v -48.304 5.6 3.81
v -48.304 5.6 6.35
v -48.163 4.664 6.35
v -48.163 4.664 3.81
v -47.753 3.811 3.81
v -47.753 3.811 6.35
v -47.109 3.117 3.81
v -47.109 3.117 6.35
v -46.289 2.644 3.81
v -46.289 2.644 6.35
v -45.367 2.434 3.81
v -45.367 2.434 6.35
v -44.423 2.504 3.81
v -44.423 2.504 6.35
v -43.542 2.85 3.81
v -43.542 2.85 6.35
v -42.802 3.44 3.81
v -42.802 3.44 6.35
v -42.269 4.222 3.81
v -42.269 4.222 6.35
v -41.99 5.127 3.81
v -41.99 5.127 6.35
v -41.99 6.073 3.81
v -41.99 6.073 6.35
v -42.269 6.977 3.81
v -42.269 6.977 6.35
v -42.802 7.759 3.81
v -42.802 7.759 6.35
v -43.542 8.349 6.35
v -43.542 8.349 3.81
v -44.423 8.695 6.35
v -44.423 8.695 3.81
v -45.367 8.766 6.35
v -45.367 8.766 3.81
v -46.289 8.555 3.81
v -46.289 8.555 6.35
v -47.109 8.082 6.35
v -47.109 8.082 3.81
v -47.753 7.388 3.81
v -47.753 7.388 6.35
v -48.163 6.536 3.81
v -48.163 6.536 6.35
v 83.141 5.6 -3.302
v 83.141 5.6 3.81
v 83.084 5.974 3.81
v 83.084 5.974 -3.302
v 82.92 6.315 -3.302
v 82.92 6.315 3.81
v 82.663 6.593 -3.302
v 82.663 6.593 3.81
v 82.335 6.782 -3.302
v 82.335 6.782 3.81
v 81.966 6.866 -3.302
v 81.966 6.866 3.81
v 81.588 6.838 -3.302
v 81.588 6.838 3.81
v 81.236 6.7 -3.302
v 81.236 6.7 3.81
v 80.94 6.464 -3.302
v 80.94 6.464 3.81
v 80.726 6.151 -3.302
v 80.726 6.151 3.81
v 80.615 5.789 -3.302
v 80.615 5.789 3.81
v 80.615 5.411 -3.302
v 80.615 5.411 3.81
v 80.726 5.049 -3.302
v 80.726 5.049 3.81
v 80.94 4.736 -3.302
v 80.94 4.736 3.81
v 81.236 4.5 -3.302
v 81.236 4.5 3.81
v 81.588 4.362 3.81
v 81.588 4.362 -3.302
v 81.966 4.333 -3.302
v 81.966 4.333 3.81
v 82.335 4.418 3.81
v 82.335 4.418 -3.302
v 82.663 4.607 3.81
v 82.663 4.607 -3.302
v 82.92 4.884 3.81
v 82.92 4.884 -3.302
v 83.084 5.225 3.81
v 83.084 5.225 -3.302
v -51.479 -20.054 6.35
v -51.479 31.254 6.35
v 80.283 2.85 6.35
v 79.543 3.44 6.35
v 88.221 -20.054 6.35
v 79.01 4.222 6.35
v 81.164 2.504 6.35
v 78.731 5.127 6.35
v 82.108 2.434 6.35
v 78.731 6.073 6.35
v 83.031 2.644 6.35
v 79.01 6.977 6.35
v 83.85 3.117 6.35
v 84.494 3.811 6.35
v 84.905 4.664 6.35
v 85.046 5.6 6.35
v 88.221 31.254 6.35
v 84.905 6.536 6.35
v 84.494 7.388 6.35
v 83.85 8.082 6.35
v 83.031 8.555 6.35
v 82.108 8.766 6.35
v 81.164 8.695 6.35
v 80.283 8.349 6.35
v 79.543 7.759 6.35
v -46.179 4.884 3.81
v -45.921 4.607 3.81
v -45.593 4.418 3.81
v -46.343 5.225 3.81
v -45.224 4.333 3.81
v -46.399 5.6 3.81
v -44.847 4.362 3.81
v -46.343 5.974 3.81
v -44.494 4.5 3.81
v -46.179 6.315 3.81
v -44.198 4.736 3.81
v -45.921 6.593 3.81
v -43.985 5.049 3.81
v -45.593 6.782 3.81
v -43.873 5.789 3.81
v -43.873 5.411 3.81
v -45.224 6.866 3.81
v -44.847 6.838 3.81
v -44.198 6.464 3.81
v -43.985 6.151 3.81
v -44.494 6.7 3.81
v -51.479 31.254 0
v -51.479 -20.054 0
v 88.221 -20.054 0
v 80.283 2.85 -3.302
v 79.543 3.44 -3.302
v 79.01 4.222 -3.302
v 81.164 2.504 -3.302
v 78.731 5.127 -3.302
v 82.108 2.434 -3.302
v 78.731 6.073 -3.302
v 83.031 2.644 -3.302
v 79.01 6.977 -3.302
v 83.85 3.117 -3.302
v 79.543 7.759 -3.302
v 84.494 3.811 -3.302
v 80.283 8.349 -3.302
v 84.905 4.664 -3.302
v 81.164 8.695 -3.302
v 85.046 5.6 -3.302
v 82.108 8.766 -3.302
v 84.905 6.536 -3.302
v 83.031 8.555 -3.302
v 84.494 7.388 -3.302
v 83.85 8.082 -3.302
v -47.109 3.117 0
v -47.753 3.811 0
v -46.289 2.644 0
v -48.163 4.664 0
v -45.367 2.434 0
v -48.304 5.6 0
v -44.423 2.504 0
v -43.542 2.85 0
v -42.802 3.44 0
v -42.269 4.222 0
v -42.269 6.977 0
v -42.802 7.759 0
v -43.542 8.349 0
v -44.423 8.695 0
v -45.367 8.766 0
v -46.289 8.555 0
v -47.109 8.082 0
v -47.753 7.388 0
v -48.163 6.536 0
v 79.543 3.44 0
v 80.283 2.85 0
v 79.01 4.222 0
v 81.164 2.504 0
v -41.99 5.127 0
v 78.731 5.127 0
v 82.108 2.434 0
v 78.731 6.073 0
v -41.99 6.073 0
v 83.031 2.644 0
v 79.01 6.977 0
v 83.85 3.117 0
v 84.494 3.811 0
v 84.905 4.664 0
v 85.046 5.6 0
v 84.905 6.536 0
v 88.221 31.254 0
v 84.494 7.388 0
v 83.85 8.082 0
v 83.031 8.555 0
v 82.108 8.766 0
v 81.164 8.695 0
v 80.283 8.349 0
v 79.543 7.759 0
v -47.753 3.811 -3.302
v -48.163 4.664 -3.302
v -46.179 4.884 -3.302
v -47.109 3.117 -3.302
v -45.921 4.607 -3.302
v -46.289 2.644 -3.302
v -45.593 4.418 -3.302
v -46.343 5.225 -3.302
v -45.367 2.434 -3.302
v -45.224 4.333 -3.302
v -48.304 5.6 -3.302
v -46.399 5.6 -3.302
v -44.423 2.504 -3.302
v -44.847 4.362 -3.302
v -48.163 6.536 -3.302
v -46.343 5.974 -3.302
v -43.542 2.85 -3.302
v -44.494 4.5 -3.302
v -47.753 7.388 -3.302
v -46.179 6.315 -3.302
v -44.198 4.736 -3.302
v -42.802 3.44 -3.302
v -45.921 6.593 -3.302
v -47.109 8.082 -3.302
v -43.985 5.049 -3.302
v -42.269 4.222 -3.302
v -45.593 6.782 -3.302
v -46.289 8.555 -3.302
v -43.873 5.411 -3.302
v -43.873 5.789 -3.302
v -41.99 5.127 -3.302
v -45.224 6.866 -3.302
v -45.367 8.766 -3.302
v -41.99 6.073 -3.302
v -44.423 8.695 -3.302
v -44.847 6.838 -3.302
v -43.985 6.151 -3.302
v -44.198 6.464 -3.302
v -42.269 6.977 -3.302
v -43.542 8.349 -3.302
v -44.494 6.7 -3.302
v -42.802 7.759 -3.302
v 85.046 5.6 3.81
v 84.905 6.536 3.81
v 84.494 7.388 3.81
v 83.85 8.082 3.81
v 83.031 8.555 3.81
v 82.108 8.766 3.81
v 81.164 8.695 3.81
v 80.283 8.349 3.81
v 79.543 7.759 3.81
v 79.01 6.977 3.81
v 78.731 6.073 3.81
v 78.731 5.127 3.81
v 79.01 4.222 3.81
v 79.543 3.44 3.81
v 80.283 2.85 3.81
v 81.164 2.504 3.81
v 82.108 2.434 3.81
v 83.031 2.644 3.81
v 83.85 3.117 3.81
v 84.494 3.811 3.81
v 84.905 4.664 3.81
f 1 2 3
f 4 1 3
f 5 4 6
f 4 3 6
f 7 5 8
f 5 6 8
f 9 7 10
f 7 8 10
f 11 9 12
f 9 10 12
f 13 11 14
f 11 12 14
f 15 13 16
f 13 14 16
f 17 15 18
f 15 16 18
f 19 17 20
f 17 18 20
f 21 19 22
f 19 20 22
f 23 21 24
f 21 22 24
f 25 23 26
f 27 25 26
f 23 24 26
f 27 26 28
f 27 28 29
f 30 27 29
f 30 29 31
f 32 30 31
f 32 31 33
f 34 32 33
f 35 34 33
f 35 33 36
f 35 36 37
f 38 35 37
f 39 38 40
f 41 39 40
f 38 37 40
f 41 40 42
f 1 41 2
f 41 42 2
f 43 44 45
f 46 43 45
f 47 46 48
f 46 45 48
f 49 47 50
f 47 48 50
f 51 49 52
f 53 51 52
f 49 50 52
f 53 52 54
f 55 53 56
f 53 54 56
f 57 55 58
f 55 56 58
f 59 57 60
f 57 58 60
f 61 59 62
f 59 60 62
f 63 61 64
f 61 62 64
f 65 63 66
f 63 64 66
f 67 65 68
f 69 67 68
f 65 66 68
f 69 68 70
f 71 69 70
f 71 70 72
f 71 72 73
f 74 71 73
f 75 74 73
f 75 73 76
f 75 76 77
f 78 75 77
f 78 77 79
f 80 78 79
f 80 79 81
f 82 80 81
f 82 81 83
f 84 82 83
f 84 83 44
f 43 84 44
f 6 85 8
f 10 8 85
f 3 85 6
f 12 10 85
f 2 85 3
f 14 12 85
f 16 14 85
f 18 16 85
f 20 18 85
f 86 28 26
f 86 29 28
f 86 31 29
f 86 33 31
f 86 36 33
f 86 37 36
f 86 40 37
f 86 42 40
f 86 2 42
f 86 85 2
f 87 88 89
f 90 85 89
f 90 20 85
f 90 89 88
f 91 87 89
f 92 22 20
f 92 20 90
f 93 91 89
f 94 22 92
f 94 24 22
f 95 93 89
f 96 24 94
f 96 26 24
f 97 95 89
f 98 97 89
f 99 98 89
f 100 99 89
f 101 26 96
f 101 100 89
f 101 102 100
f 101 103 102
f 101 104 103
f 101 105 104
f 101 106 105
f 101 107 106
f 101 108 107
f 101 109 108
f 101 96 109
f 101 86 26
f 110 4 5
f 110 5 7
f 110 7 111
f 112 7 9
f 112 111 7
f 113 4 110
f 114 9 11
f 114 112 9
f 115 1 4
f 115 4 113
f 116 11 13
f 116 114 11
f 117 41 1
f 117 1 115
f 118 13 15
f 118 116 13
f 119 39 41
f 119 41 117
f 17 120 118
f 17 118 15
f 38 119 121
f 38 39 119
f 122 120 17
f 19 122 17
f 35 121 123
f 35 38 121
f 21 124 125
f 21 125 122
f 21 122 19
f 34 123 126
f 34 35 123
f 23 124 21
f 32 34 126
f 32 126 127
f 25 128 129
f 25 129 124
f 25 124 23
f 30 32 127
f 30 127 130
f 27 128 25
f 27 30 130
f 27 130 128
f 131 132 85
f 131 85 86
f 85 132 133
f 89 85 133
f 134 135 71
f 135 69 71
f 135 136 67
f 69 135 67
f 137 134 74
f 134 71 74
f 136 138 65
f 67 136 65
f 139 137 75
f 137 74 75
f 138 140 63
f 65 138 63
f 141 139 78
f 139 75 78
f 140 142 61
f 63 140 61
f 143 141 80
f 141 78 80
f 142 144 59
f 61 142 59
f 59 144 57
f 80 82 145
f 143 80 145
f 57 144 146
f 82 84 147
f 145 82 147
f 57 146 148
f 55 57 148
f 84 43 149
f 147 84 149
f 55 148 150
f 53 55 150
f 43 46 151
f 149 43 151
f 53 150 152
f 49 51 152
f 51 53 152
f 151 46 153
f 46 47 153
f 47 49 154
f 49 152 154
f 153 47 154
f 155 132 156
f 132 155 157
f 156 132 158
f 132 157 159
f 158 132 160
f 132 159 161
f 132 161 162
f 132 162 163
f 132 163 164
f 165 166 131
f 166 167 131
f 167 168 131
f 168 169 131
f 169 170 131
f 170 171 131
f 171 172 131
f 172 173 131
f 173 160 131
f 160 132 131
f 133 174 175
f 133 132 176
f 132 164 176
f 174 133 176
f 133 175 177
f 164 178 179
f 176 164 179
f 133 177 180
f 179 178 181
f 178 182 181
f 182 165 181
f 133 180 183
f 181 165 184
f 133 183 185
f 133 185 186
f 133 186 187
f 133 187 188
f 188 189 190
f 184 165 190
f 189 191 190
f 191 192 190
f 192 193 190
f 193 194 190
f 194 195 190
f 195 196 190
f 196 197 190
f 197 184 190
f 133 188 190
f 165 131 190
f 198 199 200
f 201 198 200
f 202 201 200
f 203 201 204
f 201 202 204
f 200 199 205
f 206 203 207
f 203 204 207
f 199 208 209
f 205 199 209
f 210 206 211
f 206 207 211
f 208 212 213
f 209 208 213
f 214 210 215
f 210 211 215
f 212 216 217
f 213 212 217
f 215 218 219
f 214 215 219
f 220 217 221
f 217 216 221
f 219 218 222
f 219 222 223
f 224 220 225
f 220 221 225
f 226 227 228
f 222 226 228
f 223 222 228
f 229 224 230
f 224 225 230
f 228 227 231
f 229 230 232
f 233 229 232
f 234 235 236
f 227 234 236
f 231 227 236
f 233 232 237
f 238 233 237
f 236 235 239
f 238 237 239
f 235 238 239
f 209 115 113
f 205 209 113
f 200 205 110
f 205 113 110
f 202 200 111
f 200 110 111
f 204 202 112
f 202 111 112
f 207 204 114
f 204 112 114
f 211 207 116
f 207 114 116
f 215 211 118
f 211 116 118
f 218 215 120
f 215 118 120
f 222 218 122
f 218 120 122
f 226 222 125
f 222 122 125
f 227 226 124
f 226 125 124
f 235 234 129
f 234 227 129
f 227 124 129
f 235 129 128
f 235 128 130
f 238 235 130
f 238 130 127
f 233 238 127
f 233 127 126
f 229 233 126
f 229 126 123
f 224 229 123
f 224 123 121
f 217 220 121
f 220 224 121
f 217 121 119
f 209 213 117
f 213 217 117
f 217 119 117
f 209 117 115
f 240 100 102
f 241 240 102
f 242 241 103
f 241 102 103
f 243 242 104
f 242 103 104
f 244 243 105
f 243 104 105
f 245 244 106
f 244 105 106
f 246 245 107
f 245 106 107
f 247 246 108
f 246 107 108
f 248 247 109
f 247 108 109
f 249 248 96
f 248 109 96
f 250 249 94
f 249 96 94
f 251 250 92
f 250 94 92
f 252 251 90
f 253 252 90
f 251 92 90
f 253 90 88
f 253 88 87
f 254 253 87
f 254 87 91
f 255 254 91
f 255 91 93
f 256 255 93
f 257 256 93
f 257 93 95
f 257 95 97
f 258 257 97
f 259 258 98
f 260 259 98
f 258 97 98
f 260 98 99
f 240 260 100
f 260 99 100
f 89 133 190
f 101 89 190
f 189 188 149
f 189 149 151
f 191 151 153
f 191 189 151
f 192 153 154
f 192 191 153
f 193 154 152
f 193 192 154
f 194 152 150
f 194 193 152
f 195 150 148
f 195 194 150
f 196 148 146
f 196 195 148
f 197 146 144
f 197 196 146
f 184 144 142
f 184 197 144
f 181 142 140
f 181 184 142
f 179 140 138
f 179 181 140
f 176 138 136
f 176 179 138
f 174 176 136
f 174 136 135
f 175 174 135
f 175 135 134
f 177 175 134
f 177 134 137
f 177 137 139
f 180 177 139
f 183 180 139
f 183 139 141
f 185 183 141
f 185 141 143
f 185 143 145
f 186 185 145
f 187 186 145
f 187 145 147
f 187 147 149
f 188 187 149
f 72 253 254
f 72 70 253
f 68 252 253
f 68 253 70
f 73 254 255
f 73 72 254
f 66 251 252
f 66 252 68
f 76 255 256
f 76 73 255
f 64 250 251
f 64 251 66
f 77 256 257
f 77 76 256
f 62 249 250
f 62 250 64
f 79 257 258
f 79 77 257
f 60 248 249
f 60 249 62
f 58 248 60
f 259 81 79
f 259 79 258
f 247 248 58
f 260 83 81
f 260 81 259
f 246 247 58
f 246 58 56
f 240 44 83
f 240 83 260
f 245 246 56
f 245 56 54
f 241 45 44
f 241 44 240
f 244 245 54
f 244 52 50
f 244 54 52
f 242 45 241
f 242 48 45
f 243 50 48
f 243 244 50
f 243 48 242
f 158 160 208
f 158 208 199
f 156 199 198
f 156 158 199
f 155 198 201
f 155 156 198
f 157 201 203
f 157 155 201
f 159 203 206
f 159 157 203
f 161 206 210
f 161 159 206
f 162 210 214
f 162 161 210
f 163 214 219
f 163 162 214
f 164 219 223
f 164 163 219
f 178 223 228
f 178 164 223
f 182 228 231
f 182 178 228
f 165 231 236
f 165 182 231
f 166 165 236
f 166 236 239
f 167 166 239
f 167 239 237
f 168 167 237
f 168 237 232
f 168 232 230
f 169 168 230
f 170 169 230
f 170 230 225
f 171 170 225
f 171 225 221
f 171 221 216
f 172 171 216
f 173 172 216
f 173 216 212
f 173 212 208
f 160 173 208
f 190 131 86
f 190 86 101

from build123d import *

# Parameters (mm, degrees)
F0_W     = 139.7
F0_H     = 51.308
F1_DEPTH = 6.35
F2_R     = 1.27
F3_DEPTH = 10.414
F2_R_2   = 3.175
F4_DEPTH = 2.54
F5_DEPTH = 7.112


with BuildPart() as f1:
    # F0 (on Top) → F1 (new body)
    with BuildSketch(Plane.XY):
        with Locations((18.3706976533, 5.599814237)):
            Rectangle(F0_W, F0_H)
    extrude(amount=F1_DEPTH)

    # F2 (on face) → F3 (cut)
    with BuildSketch(Plane.XY.offset(6.35)):
        with BuildLine():
            ThreePointArc((-43.8593023467, 5.599814237), (-45.1293023467, 6.869814237), (-46.3993023467, 5.599814237))
            ThreePointArc((-46.3993023467, 5.599814237), (-45.1293023467, 4.329814237), (-43.8593023467, 5.599814237))
        make_face()
        with Locations((81.8706976533, 5.599814237)):
            Circle(F2_R)
    extrude(amount=-F3_DEPTH, mode=Mode.SUBTRACT)

    # F2 (on face) → F4 (cut)
    with BuildSketch(Plane.XY.offset(6.35)):
        with BuildLine():
            ThreePointArc((-41.9543023467, 5.599814237), (-45.1293023467, 8.774814237), (-48.3043023467, 5.599814237))
            ThreePointArc((-48.3043023467, 5.599814237), (-45.1293023467, 2.424814237), (-41.9543023467, 5.599814237))
        make_face()
        with BuildLine():
            ThreePointArc((-43.8593023467, 5.599814237), (-45.1293023467, 4.329814237), (-46.3993023467, 5.599814237))
            ThreePointArc((-46.3993023467, 5.599814237), (-45.1293023467, 6.869814237), (-43.8593023467, 5.599814237))
        make_face(mode=Mode.SUBTRACT)
        with Locations((81.8706976533, 5.599814237)):
            Circle(F2_R_2)
        with Locations((81.8706976533, 5.599814237)):
            Circle(F2_R, mode=Mode.SUBTRACT)
    extrude(amount=-F4_DEPTH, mode=Mode.SUBTRACT)

    # F5 (add): faces of the model
    f5_faces = [f1.faces().sort_by_distance(p)[0] for p in [
        (-42.0441049079, 5.599814237, 3.81),
        (78.7855002145, 5.599814237, 3.81),
    ]]
    extrude(f5_faces, amount=-F5_DEPTH)


solid = f1.part
